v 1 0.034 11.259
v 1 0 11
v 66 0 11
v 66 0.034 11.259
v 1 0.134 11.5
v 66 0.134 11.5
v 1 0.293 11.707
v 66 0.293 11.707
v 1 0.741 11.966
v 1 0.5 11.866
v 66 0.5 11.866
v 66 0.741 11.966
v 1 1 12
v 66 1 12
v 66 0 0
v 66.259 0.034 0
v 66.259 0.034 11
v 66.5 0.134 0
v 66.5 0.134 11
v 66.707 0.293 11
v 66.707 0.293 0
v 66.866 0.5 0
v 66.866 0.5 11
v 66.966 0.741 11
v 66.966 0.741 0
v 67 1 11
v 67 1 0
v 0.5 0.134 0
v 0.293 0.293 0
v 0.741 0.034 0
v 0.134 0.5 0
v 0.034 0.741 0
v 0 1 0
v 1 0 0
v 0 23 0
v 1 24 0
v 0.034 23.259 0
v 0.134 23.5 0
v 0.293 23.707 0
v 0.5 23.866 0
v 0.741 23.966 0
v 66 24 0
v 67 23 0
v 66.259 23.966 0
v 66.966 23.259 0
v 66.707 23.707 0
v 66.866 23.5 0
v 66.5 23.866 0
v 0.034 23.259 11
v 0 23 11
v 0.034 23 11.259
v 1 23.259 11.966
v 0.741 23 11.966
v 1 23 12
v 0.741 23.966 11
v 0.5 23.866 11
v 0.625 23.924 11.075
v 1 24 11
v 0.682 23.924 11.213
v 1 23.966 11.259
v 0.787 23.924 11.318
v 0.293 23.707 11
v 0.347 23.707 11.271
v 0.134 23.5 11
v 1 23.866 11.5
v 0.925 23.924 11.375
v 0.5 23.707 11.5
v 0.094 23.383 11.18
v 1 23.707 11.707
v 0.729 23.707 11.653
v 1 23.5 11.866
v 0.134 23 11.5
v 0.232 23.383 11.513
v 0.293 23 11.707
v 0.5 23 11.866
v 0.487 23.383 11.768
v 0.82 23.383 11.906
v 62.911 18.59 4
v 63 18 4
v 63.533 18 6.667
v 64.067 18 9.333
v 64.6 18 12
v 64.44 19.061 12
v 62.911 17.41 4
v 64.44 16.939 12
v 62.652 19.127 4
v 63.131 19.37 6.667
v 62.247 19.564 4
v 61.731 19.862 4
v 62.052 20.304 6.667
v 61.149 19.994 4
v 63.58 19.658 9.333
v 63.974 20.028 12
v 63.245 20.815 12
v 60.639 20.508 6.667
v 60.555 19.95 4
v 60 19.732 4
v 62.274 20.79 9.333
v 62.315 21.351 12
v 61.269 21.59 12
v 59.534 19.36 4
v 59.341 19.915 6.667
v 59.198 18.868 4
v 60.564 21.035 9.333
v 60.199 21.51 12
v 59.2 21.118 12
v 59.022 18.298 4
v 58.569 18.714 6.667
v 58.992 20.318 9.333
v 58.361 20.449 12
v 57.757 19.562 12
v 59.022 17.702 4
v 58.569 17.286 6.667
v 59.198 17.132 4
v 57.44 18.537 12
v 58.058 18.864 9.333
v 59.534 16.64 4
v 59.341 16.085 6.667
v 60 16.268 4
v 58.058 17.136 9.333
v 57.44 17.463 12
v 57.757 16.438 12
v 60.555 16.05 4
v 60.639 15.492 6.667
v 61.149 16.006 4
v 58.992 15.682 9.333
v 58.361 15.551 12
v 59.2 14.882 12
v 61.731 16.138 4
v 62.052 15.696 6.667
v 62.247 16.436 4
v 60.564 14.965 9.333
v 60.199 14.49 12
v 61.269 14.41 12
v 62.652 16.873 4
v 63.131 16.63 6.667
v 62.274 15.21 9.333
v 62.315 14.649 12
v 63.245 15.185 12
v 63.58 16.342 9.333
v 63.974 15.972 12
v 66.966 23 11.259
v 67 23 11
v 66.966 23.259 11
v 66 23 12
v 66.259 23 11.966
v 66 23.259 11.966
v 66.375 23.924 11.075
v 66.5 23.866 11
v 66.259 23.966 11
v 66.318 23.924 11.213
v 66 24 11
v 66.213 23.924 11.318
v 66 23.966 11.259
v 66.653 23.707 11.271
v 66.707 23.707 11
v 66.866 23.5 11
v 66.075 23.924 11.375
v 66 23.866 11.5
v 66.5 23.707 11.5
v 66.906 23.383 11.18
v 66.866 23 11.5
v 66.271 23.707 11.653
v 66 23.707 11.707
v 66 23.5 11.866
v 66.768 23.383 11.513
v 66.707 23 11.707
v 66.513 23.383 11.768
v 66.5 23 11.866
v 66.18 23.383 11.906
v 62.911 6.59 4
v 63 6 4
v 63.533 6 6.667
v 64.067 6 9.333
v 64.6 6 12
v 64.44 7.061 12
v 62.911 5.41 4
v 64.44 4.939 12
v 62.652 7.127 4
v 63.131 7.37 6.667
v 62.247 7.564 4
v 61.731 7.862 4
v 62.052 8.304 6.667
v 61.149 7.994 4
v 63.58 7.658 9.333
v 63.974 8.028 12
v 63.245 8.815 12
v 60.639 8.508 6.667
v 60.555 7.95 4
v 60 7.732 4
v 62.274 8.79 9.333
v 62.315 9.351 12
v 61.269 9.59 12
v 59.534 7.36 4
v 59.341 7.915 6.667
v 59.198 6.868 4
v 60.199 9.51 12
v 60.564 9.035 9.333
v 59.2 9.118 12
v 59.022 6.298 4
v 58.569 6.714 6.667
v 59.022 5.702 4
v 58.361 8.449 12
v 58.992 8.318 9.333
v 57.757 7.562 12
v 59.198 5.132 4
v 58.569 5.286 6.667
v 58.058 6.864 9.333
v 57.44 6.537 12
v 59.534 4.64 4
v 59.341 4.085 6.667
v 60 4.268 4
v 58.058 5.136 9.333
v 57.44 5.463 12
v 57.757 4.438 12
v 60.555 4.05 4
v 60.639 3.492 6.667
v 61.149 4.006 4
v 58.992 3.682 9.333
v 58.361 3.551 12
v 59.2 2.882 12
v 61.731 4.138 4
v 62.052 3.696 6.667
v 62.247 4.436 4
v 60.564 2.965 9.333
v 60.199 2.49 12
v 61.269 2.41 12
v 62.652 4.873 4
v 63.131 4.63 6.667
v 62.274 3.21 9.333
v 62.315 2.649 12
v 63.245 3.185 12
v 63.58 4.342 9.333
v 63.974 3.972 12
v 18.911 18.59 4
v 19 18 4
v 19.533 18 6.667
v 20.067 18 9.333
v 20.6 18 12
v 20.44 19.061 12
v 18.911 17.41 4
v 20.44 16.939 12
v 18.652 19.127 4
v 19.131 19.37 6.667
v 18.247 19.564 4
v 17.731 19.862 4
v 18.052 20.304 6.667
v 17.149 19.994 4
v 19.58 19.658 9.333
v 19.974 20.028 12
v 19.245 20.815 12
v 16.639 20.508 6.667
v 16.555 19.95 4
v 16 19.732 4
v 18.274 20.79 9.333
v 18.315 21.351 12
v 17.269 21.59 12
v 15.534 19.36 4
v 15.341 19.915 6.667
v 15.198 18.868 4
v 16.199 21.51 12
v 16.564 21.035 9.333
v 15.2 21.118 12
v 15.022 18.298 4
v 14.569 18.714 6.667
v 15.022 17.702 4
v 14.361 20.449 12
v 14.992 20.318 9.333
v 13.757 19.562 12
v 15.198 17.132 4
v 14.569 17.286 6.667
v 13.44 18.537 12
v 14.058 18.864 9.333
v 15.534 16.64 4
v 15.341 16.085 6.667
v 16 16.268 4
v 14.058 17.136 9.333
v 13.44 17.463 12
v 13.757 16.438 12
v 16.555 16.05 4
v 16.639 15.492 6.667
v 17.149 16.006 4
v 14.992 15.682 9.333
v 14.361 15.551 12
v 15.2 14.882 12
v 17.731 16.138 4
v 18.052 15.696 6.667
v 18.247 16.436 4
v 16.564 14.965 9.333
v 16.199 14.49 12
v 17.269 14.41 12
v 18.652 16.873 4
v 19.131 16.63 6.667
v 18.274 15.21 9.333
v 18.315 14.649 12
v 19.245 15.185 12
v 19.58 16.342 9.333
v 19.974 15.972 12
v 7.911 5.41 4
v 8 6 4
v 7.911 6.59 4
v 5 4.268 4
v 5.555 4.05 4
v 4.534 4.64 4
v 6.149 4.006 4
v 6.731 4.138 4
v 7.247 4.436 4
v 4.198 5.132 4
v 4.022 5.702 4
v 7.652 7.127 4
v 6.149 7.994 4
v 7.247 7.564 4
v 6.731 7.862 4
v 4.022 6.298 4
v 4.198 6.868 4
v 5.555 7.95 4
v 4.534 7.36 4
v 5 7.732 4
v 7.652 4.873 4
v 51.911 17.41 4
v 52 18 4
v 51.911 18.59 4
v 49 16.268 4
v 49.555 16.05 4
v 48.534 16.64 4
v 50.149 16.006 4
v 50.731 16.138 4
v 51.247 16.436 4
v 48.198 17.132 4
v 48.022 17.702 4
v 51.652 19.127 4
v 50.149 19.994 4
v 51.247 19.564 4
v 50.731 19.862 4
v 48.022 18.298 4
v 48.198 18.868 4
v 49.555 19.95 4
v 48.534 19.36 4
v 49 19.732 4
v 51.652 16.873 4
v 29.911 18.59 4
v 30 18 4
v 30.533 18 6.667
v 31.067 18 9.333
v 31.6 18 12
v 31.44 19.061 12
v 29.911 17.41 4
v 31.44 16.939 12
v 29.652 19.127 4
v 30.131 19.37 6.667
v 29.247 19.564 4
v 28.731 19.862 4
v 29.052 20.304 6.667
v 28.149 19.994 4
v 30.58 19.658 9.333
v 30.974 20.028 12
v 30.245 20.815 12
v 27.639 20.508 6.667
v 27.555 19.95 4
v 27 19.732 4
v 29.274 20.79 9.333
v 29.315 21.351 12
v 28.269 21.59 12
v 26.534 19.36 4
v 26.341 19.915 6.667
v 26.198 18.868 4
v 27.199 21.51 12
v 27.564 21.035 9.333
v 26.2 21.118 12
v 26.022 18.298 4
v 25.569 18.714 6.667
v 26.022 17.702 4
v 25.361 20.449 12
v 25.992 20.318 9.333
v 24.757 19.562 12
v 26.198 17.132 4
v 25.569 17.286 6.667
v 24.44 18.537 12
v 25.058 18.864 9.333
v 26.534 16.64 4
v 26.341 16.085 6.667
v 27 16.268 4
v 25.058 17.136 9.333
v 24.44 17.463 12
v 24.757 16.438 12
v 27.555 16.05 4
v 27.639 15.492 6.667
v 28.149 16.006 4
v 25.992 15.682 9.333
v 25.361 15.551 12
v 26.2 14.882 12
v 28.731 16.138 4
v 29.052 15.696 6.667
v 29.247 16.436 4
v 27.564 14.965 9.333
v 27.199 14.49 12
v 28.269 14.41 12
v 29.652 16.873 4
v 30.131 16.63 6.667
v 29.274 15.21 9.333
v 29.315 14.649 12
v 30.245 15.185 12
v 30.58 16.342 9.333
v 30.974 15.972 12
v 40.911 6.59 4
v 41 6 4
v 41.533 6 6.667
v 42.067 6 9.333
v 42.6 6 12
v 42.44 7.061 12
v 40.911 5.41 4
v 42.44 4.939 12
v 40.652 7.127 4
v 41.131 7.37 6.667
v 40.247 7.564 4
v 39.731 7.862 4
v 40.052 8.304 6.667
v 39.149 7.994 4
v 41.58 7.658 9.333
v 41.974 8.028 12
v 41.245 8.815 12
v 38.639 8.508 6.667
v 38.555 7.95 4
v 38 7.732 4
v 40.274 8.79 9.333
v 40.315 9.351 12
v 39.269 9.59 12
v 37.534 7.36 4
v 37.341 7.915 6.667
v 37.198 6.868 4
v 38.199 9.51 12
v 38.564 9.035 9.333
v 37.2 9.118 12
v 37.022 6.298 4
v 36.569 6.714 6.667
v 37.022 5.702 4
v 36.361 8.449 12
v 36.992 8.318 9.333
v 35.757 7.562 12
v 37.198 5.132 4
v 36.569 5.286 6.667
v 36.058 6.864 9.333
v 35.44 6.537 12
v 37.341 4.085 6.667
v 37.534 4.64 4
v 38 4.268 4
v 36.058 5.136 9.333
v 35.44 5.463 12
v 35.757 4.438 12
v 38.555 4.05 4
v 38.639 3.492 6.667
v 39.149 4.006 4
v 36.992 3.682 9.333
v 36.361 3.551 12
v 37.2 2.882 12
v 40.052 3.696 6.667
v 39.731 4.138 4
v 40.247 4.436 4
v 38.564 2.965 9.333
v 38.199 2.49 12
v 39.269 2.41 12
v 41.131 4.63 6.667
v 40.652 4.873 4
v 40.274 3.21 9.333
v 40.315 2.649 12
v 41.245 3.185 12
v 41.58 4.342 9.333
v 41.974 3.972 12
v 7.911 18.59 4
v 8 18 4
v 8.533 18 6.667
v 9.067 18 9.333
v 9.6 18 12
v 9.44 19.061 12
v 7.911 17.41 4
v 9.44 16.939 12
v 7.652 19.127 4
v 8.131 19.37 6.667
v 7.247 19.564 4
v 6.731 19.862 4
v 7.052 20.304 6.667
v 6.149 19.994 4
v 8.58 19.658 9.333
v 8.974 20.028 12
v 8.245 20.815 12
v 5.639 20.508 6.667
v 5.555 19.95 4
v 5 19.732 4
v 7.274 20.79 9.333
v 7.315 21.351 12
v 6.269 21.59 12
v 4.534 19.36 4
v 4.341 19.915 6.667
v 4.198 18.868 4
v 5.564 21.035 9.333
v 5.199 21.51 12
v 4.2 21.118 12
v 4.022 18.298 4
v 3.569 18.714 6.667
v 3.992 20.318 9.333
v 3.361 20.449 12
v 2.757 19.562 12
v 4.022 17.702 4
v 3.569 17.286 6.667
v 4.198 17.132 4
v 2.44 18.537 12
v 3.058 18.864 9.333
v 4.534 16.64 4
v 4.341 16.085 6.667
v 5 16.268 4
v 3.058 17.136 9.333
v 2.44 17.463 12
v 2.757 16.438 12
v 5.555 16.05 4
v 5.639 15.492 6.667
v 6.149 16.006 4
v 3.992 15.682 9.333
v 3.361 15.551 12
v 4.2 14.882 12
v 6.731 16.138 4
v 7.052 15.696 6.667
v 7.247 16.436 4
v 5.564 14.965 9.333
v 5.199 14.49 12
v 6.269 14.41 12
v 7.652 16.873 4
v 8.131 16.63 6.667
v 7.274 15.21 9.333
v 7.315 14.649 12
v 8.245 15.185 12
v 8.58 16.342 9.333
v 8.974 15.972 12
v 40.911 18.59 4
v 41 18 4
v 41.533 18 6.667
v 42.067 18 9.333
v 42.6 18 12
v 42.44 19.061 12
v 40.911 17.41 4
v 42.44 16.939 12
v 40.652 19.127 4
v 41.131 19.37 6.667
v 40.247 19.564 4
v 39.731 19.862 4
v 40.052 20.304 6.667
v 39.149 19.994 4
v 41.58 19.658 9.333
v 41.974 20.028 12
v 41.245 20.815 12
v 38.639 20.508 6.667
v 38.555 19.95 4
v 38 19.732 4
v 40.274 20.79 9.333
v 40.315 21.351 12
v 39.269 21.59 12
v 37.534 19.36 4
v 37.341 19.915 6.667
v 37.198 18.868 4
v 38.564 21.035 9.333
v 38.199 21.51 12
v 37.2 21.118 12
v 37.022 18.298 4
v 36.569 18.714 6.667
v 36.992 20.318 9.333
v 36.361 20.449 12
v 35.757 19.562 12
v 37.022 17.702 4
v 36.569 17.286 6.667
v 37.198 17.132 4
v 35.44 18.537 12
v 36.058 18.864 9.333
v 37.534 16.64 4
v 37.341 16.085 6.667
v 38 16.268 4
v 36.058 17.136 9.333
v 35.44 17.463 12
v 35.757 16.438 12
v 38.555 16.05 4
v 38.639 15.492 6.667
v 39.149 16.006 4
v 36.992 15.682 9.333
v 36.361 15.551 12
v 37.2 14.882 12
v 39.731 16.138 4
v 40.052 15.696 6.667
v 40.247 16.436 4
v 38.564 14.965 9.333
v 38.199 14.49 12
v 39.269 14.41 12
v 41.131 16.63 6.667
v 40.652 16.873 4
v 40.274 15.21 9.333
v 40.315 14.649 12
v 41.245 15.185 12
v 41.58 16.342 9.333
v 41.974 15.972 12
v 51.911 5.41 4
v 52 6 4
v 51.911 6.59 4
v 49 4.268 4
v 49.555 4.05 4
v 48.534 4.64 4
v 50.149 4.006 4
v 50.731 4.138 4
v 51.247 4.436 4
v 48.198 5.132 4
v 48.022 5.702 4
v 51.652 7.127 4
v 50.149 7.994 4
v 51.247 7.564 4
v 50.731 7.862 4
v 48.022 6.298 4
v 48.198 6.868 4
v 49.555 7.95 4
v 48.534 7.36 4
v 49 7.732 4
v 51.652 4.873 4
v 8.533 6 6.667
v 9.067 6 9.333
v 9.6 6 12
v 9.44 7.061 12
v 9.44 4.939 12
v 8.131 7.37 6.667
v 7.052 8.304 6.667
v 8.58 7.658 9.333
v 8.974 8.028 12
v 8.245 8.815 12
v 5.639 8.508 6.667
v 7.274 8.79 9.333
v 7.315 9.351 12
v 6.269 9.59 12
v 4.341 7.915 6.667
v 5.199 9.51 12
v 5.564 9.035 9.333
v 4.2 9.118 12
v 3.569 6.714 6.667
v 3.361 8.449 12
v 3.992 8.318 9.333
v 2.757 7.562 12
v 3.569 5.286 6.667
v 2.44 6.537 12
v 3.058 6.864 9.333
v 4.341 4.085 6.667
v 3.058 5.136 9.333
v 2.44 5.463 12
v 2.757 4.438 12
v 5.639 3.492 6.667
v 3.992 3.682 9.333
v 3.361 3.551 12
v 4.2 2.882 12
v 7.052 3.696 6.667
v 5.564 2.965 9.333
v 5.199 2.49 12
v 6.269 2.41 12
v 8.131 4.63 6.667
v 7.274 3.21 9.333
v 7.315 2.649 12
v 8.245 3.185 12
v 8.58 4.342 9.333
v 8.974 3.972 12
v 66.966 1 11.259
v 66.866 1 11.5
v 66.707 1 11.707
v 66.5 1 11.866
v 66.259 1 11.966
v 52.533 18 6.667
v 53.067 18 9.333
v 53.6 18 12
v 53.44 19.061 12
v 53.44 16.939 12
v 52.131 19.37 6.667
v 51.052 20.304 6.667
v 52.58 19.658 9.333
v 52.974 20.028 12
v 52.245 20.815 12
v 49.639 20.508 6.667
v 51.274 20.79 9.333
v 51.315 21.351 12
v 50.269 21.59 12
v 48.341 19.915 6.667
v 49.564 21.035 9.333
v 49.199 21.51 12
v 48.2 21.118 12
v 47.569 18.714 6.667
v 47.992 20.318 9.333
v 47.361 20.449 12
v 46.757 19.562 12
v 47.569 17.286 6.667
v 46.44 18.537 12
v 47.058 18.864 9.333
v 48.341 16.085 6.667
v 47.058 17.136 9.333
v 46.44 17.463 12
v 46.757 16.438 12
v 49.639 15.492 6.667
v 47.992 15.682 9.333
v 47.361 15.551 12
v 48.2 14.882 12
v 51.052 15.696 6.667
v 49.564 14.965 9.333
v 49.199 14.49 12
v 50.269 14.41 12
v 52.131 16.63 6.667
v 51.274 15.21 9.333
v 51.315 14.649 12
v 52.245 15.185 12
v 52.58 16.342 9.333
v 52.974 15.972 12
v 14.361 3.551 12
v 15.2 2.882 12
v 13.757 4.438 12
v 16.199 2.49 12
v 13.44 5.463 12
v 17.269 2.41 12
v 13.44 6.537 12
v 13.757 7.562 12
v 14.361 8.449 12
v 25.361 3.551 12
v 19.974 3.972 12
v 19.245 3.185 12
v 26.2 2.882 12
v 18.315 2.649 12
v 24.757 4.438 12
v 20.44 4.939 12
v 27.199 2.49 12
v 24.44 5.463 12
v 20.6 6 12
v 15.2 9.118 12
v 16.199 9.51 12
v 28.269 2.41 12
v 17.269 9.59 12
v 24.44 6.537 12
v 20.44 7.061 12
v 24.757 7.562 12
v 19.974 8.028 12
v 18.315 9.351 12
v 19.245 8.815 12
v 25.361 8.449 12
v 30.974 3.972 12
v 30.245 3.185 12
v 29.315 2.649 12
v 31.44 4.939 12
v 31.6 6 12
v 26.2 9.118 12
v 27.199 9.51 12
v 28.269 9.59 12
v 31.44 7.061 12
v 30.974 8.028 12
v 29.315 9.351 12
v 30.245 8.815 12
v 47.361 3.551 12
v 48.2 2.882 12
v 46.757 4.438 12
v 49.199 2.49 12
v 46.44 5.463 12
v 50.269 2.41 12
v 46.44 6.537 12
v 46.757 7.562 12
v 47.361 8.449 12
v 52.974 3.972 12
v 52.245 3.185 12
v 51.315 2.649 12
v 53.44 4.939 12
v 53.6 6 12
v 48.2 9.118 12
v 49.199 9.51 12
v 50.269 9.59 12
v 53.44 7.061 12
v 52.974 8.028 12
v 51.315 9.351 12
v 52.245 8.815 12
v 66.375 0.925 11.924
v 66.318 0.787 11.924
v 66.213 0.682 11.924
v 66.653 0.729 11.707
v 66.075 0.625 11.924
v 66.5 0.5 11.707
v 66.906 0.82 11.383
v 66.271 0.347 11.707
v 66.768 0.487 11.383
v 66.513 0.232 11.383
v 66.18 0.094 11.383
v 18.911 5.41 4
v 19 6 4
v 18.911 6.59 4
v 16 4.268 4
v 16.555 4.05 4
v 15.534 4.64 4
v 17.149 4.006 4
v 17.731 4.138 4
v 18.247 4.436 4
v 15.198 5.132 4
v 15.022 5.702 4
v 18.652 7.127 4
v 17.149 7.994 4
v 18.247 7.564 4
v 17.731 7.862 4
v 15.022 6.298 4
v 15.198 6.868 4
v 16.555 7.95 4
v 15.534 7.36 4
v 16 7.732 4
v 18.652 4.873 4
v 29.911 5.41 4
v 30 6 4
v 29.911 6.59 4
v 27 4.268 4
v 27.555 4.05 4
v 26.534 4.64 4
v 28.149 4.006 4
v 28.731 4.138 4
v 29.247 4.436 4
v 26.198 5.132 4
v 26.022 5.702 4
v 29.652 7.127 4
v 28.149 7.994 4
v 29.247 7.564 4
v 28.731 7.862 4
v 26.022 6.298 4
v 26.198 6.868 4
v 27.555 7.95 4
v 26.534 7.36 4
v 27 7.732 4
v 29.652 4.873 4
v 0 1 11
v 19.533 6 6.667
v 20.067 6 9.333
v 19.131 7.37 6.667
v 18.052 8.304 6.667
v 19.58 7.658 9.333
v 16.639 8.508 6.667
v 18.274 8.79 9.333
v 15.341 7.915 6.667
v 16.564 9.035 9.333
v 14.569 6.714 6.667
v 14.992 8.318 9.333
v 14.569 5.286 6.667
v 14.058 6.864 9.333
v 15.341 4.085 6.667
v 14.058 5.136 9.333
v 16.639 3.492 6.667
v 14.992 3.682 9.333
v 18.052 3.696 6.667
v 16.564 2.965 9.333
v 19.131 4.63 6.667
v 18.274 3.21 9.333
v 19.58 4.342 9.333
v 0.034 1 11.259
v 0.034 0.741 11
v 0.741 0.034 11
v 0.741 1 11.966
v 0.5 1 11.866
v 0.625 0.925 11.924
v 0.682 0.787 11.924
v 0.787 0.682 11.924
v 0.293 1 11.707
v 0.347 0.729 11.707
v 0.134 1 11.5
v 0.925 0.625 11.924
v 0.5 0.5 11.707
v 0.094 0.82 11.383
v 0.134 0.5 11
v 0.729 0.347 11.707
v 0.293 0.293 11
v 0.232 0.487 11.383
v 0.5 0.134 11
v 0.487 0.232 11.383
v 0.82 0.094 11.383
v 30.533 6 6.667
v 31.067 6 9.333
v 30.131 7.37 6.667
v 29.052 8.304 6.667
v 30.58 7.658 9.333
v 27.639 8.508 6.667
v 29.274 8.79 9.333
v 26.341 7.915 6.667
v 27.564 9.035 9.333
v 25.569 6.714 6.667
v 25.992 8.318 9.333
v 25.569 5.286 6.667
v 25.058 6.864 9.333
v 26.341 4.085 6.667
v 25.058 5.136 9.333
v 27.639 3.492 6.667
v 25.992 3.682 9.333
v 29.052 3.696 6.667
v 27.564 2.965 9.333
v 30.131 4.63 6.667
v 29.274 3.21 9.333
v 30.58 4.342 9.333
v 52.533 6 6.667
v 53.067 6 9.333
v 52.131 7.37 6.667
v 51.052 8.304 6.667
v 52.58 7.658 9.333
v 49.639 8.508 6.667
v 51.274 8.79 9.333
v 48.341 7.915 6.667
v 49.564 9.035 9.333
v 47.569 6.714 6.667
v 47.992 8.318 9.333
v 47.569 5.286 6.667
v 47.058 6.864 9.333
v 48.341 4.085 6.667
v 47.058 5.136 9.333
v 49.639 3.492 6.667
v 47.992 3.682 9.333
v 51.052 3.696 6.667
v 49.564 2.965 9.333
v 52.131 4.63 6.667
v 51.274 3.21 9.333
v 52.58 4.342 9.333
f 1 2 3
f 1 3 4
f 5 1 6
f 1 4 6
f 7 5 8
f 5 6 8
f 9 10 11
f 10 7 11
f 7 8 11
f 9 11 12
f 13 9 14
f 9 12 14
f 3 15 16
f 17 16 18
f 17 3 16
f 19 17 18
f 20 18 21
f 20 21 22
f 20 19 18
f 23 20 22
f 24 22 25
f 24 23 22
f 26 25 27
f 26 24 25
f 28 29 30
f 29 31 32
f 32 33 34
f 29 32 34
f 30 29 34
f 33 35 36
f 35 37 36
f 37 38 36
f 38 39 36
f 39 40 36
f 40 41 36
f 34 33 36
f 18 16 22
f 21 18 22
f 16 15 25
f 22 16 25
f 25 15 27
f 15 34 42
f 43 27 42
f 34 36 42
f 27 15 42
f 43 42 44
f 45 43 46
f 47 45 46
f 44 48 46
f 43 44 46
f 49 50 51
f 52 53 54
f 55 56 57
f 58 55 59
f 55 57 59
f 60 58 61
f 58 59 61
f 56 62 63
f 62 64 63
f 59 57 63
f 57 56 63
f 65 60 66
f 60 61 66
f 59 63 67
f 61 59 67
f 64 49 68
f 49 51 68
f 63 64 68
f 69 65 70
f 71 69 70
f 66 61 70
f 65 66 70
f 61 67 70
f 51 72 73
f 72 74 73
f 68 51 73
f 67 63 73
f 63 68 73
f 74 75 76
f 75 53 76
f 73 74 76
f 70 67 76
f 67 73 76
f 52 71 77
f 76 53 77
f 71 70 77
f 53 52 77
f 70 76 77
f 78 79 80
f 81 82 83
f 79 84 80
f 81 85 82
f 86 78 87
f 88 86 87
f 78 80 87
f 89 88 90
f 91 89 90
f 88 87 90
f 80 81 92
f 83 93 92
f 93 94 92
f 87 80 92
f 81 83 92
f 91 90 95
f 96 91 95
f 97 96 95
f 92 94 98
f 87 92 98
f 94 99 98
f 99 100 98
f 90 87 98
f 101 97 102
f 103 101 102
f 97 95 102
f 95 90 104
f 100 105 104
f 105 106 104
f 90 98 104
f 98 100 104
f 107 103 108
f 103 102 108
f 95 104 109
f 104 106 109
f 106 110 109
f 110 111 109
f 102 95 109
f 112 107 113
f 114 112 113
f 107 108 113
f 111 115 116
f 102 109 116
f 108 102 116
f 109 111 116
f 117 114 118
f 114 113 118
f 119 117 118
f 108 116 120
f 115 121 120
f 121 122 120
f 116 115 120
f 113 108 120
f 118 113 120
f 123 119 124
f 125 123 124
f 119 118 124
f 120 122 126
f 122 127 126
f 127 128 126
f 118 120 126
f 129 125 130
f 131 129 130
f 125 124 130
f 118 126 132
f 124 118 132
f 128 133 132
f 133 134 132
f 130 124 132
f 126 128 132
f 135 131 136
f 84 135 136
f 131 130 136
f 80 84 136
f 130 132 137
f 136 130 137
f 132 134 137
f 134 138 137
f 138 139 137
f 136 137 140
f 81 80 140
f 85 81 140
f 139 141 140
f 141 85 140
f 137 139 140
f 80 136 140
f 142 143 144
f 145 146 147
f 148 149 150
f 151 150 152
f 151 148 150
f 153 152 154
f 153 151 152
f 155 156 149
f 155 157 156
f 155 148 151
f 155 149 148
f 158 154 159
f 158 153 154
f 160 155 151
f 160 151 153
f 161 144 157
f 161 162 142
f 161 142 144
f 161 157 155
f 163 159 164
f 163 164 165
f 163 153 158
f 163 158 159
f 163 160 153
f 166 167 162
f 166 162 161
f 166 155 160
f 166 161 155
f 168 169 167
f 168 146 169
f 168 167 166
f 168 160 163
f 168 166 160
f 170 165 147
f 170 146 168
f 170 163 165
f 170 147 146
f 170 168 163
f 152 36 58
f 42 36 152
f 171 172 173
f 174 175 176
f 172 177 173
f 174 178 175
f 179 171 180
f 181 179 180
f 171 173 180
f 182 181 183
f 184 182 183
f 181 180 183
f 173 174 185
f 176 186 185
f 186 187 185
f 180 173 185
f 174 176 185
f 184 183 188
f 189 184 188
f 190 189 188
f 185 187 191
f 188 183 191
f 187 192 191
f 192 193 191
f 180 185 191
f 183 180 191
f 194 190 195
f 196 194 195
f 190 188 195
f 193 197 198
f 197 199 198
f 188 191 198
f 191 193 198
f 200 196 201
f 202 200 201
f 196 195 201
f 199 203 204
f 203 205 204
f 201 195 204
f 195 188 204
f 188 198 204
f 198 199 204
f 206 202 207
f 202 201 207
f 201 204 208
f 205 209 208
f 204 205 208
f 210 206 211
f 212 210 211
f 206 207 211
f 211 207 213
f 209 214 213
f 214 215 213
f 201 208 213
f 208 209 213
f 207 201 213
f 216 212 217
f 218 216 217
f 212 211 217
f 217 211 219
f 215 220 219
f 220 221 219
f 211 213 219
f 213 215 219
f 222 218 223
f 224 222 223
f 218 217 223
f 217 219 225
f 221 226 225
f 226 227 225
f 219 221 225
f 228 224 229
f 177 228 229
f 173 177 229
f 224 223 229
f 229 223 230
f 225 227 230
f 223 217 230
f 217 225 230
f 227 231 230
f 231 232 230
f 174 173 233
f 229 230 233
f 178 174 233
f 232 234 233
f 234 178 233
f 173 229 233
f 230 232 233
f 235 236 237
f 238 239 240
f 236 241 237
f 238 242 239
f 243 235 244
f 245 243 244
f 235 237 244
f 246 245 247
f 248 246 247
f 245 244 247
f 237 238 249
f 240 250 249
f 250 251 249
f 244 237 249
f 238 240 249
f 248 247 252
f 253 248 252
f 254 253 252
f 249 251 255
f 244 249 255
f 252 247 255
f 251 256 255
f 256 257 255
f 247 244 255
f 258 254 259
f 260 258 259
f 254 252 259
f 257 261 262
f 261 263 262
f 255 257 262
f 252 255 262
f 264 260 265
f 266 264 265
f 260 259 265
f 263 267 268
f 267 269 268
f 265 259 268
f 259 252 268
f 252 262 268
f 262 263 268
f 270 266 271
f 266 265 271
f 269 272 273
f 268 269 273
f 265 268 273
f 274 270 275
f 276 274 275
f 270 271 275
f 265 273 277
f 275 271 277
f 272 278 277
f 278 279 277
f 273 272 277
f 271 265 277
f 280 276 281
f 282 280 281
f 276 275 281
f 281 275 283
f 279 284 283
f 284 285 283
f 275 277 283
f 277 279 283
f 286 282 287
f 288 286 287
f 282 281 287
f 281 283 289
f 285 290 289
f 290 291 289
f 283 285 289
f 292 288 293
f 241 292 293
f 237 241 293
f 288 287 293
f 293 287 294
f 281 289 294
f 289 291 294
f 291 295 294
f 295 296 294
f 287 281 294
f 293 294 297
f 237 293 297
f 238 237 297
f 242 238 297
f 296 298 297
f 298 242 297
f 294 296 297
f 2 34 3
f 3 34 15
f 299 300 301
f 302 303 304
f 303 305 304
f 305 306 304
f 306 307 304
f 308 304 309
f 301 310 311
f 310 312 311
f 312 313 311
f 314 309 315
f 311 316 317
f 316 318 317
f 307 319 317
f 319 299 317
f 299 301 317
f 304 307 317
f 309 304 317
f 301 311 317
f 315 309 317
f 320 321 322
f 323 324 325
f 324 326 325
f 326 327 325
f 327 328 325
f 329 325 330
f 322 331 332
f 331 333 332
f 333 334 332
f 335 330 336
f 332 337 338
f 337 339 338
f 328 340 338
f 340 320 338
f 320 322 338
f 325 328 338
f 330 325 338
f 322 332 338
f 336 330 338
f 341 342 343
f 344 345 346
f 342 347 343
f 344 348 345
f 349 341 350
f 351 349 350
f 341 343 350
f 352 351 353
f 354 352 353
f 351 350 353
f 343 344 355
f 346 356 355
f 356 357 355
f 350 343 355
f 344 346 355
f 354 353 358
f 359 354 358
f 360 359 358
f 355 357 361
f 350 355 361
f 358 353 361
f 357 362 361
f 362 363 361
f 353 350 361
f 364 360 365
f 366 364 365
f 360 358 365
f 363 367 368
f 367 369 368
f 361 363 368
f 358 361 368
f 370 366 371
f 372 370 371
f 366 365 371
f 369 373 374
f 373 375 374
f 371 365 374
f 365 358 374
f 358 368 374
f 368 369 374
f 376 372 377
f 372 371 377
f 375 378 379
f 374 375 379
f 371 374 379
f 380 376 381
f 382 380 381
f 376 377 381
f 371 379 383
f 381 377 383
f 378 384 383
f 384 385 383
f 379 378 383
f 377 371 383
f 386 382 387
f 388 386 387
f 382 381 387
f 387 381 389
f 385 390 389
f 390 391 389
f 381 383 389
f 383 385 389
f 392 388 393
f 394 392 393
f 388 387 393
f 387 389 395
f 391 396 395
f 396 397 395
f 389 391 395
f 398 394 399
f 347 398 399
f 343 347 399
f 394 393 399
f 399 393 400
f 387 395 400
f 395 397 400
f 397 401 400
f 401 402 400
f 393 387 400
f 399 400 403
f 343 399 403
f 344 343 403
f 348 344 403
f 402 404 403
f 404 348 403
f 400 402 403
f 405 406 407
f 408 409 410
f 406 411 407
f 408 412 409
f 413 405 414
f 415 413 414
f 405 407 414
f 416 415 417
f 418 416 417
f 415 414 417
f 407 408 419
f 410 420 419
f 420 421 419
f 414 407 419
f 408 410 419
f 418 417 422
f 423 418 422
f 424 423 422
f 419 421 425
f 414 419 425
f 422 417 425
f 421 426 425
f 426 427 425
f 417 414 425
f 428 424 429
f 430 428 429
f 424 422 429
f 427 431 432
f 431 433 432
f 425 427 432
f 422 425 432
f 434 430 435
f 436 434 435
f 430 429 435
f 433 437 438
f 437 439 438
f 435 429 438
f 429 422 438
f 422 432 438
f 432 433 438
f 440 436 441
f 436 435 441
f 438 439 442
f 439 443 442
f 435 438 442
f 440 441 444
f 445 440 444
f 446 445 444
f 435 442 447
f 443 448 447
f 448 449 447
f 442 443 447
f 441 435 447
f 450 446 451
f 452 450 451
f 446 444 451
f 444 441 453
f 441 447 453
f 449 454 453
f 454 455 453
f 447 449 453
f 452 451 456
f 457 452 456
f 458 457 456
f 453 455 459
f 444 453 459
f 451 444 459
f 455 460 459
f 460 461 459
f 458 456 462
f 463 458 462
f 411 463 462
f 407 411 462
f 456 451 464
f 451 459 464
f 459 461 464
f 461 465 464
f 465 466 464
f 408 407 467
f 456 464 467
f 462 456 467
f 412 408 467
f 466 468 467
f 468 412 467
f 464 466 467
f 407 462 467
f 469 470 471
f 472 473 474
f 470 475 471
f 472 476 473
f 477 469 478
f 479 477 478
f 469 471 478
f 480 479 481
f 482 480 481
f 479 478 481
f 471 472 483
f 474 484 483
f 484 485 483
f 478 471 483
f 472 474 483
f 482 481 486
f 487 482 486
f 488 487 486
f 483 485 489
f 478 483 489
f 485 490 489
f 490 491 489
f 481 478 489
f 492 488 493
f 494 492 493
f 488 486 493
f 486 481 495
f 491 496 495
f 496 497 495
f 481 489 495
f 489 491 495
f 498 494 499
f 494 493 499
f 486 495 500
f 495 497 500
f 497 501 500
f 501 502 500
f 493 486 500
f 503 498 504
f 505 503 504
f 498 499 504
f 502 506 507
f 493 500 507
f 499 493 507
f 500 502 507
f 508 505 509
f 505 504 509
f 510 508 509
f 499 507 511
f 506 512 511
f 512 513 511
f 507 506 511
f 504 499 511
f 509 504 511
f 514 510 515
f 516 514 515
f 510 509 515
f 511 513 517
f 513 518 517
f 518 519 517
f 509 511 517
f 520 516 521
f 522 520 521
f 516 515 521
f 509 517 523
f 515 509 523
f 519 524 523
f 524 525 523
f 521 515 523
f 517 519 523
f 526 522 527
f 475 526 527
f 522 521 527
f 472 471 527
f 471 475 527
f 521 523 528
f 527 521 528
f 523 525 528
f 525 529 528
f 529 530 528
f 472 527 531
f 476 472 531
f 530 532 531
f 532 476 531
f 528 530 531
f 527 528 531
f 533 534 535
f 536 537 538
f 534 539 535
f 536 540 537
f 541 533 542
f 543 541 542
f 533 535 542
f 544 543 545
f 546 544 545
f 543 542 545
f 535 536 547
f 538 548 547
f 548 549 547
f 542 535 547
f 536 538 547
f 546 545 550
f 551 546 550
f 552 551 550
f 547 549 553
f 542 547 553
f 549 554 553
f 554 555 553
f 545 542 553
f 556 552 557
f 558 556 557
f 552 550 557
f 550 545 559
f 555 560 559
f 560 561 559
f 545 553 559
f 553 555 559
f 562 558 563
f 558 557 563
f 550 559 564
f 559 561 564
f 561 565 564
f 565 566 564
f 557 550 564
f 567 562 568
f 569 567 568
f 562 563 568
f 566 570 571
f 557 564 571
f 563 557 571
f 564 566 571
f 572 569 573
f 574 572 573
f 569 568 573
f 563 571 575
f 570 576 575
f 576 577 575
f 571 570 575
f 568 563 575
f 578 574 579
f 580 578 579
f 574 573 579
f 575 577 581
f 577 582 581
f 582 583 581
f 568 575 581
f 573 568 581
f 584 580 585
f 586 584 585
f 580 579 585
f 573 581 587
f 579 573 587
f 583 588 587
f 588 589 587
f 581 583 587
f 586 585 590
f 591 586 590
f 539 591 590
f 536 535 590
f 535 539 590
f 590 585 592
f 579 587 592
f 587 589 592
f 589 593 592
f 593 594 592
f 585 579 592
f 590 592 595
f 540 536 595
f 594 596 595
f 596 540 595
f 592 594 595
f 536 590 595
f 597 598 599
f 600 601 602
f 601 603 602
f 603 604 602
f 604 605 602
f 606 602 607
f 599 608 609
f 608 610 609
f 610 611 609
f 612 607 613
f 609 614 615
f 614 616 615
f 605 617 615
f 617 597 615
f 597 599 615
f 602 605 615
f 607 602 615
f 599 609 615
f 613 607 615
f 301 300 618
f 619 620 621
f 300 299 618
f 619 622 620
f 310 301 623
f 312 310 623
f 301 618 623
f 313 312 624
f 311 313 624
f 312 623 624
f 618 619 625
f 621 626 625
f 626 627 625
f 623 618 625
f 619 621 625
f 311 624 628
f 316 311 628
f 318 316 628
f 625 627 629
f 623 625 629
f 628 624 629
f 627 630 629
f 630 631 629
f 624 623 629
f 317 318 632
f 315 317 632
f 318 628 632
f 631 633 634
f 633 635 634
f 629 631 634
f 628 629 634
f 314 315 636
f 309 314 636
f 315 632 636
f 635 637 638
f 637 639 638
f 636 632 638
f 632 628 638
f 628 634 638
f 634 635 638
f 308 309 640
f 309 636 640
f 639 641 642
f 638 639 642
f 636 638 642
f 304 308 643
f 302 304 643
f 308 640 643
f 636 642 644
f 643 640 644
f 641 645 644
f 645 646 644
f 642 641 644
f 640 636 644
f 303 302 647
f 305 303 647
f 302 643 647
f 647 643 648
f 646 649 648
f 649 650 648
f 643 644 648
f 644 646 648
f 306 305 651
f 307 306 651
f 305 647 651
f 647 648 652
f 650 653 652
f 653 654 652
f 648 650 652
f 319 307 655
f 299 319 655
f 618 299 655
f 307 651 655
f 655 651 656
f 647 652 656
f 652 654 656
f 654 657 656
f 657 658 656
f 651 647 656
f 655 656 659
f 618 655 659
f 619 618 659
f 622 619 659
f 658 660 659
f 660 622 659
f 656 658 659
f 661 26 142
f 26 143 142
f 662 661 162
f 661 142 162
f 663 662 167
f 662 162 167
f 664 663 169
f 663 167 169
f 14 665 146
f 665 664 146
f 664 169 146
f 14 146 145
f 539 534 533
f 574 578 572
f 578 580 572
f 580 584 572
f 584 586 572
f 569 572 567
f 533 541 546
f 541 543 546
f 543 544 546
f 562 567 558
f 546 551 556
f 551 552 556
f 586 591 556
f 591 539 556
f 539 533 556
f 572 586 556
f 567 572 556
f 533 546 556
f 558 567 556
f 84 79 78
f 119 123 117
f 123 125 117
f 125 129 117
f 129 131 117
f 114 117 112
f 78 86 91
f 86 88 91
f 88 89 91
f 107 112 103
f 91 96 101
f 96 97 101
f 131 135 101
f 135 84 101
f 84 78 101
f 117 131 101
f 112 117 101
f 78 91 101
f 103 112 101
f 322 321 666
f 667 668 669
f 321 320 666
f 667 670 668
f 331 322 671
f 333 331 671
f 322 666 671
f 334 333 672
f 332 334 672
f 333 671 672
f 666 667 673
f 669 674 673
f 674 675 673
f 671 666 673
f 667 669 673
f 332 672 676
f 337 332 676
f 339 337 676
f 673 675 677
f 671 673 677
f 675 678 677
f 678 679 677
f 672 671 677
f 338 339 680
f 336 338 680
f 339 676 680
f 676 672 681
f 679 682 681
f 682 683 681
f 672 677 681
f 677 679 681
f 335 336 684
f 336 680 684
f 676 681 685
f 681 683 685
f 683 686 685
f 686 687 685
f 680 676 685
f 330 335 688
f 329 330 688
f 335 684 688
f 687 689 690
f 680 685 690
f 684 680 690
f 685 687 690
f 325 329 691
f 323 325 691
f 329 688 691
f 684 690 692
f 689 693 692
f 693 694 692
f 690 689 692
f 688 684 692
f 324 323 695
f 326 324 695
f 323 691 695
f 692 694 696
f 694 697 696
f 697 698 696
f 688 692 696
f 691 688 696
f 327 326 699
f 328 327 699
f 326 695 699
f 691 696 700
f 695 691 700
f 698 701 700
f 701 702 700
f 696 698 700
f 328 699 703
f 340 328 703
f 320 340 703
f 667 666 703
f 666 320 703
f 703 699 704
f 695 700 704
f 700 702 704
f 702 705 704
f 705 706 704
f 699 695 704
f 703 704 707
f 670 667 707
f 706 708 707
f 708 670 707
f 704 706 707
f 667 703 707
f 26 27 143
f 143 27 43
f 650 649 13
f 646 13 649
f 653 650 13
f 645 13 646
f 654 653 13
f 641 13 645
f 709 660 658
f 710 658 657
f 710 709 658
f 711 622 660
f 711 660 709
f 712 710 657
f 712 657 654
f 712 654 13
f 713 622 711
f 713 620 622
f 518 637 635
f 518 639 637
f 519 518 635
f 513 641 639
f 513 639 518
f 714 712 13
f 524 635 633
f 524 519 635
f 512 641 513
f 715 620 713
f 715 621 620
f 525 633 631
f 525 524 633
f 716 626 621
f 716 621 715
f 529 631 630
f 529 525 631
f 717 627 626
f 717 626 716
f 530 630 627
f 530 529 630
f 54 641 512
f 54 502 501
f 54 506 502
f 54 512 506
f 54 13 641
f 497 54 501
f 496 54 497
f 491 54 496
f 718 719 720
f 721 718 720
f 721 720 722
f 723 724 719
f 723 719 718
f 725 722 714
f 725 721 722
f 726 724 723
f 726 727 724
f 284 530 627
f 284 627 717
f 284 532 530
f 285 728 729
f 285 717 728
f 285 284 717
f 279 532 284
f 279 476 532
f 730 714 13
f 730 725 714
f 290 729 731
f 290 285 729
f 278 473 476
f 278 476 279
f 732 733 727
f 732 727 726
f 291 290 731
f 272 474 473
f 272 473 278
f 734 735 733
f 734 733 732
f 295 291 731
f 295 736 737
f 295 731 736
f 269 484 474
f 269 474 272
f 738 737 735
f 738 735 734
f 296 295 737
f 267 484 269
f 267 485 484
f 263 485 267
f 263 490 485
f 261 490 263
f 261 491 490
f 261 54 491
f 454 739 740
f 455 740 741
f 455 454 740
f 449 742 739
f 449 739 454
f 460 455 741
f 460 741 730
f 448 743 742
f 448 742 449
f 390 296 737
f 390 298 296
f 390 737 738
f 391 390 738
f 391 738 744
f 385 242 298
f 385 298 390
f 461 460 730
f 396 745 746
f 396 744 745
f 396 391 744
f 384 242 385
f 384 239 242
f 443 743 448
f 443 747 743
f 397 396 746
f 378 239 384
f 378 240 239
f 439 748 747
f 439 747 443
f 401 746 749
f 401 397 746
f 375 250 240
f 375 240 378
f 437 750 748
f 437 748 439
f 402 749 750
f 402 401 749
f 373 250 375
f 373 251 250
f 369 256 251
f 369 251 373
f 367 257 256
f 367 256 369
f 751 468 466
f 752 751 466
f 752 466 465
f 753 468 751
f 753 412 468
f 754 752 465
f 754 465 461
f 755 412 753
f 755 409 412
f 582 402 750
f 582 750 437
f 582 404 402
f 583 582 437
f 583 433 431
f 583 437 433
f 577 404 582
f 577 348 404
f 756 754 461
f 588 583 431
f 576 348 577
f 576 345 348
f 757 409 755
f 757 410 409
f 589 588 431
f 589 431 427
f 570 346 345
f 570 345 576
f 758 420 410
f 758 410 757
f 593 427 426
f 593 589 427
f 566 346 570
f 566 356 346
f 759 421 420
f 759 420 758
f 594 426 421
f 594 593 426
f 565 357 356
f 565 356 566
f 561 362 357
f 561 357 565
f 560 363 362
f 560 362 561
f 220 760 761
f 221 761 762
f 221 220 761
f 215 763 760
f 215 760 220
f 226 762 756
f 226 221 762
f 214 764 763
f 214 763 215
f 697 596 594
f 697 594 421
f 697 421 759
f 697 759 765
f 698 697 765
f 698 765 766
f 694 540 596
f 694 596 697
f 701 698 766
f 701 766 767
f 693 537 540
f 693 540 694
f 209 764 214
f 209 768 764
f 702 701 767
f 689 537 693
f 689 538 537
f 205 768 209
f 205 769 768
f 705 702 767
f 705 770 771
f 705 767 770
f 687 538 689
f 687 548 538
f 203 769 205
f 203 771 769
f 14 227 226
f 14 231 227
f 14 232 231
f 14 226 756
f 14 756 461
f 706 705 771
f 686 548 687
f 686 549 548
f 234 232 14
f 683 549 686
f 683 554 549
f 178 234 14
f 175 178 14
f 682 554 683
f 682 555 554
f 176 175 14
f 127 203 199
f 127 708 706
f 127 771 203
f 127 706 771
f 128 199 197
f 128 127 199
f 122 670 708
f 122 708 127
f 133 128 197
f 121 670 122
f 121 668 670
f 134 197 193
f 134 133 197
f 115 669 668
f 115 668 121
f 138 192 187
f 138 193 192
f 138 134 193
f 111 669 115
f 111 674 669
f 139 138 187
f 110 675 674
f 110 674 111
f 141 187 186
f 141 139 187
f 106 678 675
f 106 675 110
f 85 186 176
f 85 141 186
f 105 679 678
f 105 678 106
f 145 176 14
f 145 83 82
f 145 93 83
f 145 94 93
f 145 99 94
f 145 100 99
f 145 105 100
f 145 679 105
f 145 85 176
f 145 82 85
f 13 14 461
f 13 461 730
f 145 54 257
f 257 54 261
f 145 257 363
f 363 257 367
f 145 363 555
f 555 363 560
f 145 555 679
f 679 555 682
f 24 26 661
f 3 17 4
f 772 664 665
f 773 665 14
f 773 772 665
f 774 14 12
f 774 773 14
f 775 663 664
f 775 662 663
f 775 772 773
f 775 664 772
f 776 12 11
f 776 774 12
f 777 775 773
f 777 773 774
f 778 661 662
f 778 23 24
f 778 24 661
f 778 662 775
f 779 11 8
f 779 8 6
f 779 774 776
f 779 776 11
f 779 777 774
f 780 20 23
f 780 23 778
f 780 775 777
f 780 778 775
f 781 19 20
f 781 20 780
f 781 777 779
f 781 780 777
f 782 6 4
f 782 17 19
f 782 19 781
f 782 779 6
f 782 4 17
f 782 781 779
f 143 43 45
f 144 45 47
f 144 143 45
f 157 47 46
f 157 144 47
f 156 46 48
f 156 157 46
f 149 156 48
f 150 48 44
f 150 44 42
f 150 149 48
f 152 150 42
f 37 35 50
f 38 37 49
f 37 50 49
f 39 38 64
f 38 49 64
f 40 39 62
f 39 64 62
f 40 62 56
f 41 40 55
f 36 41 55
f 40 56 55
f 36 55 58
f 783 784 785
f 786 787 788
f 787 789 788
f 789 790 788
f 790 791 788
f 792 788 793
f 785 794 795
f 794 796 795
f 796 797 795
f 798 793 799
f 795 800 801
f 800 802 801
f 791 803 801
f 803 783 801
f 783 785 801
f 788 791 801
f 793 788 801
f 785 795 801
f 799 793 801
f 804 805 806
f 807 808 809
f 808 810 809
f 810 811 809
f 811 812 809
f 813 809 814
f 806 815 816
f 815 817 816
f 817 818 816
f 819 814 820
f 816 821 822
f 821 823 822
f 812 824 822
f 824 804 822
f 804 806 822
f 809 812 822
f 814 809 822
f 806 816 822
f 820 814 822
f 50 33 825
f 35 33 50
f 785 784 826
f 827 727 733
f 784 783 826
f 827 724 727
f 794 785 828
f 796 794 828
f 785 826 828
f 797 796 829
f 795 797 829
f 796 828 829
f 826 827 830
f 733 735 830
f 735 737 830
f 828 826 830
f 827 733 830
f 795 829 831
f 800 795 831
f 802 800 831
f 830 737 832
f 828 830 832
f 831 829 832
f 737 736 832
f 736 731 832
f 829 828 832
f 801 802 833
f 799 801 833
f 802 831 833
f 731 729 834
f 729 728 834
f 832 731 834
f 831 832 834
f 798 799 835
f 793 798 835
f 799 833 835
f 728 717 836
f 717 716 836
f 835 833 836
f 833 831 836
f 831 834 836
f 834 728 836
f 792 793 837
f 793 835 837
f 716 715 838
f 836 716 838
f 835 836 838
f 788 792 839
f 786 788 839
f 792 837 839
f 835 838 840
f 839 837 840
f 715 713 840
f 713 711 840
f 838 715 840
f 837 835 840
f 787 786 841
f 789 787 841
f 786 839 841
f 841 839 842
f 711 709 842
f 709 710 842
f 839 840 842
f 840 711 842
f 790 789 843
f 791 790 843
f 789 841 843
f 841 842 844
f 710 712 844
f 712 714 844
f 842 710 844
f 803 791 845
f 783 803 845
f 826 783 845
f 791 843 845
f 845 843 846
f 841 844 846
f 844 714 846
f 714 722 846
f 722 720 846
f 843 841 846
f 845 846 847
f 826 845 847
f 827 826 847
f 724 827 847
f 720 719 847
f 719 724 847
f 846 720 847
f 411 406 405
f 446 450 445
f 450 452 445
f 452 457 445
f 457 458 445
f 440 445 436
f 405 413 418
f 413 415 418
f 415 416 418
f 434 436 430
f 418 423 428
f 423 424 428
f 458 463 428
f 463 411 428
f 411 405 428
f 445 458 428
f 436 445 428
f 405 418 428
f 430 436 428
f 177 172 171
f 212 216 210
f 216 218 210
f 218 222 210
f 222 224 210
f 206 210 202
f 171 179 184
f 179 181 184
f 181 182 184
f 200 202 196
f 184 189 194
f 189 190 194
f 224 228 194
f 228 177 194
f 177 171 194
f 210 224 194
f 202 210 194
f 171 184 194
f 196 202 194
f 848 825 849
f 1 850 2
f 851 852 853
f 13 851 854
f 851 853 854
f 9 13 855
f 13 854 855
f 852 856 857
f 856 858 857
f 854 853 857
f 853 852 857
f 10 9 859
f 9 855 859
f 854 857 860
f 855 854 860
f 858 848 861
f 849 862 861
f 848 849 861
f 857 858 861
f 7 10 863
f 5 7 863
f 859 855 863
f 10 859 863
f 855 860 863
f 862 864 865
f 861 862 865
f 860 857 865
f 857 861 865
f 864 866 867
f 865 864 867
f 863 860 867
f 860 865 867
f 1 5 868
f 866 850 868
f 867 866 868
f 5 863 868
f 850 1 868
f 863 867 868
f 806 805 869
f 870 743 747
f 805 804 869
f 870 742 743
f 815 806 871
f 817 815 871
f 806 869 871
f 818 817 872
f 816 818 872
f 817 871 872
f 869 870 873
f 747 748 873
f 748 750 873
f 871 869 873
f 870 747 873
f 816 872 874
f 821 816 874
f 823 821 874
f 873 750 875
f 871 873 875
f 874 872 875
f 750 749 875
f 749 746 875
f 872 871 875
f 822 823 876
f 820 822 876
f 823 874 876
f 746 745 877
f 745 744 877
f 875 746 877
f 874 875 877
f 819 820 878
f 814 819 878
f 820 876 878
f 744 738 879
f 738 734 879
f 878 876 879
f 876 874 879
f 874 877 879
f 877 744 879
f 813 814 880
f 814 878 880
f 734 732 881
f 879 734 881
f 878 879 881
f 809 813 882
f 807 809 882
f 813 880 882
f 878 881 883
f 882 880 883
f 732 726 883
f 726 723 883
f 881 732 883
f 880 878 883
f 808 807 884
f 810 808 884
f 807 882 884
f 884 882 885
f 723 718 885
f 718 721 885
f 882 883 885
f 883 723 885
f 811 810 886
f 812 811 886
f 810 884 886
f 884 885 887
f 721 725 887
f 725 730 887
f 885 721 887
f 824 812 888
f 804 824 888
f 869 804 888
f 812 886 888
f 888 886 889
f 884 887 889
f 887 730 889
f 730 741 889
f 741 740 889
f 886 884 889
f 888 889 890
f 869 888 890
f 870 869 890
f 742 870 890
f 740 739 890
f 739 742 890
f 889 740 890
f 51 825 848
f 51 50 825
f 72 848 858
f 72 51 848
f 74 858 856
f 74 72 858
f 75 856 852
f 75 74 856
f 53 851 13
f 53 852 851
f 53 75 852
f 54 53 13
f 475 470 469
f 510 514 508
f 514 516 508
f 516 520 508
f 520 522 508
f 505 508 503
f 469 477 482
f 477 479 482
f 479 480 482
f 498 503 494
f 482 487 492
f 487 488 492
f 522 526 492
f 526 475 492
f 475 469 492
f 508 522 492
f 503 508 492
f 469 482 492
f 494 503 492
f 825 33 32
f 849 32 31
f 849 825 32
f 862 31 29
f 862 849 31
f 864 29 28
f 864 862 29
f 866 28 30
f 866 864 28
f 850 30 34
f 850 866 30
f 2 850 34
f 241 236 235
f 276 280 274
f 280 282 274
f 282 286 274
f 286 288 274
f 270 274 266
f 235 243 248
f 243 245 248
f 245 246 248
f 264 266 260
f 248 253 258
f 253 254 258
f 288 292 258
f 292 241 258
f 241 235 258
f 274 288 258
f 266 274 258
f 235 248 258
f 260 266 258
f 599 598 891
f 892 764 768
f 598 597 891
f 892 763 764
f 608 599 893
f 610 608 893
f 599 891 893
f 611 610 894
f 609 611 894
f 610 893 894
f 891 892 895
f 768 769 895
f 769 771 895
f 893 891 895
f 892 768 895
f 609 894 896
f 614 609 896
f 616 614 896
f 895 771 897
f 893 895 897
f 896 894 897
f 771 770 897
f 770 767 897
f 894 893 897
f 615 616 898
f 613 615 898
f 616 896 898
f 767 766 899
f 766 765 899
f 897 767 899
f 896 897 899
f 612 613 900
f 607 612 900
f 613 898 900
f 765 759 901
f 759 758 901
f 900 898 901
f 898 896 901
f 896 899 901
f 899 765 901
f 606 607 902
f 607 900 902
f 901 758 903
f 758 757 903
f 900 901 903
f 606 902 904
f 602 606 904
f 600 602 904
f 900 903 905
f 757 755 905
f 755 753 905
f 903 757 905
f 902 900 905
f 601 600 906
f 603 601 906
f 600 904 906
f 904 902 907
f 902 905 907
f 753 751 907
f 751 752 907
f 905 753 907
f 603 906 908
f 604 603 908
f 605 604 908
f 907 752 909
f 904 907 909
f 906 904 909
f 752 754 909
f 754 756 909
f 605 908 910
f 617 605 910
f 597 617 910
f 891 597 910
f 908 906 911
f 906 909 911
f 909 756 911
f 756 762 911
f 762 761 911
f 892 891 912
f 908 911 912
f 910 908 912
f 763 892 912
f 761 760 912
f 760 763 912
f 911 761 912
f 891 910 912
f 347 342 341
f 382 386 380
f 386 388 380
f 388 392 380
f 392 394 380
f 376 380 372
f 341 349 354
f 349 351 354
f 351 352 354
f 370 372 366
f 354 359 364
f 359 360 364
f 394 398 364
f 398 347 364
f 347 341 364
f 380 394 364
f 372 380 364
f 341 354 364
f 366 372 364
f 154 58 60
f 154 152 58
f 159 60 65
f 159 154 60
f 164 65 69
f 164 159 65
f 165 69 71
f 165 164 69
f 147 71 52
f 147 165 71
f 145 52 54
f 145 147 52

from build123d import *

# Parameters (mm, degrees)
ARRAY_X_COUNT = 6
ARRAY_X_PITCH = 11
ARRAY_Y_COUNT = 2
ARRAY_Y_PITCH = 12
BOX_W         = 67
BOX_H         = 24
BOX_DEPTH     = 12
FILLET_R      = 1


with BuildPart() as array:
    # Cone → Cone (revolve)
    with BuildSketch(Plane(origin=(6, 6, 4), x_dir=(1, 0, 0), z_dir=(0, -1, 0))):
        Polygon((0, 0), (2, 0), (4, 10), (0, 10), align=None)
    revolve(axis=Axis((6, 6, 4), (0, 0, 1)))

    # Array X: Array ×6


with BuildPart() as array_1:
    add(array.part)
    with Locations(*[(i * ARRAY_X_PITCH, 0, 0) for i in range(1, ARRAY_X_COUNT)]):
        add(array.part)

    # Array Y: Array ×2


with BuildPart() as array_2:
    add(array_1.part)
    with Locations(*[(0, i * ARRAY_Y_PITCH, 0) for i in range(1, ARRAY_Y_COUNT)]):
        add(array_1.part)


with BuildPart() as cut:
    # Box → Box (new body)
    with BuildSketch(Plane.XY):
        with Locations((33.5, 12)):
            Rectangle(BOX_W, BOX_H)
    extrude(amount=BOX_DEPTH)

    # Fillet
    fillet_edges = [cut.edges().sort_by_distance(p)[0] for p in [
        (0, 0, 6),
        (0, 12, 12),
        (0, 24, 6),
        (67, 0, 6),
        (67, 12, 12),
        (67, 24, 6),
        (33.5, 0, 12),
        (33.5, 24, 12),
    ]]
    fillet(fillet_edges, radius=FILLET_R)

    # Cut: cut Array
    add(array_2.part, mode=Mode.SUBTRACT)


solid = cut.part
